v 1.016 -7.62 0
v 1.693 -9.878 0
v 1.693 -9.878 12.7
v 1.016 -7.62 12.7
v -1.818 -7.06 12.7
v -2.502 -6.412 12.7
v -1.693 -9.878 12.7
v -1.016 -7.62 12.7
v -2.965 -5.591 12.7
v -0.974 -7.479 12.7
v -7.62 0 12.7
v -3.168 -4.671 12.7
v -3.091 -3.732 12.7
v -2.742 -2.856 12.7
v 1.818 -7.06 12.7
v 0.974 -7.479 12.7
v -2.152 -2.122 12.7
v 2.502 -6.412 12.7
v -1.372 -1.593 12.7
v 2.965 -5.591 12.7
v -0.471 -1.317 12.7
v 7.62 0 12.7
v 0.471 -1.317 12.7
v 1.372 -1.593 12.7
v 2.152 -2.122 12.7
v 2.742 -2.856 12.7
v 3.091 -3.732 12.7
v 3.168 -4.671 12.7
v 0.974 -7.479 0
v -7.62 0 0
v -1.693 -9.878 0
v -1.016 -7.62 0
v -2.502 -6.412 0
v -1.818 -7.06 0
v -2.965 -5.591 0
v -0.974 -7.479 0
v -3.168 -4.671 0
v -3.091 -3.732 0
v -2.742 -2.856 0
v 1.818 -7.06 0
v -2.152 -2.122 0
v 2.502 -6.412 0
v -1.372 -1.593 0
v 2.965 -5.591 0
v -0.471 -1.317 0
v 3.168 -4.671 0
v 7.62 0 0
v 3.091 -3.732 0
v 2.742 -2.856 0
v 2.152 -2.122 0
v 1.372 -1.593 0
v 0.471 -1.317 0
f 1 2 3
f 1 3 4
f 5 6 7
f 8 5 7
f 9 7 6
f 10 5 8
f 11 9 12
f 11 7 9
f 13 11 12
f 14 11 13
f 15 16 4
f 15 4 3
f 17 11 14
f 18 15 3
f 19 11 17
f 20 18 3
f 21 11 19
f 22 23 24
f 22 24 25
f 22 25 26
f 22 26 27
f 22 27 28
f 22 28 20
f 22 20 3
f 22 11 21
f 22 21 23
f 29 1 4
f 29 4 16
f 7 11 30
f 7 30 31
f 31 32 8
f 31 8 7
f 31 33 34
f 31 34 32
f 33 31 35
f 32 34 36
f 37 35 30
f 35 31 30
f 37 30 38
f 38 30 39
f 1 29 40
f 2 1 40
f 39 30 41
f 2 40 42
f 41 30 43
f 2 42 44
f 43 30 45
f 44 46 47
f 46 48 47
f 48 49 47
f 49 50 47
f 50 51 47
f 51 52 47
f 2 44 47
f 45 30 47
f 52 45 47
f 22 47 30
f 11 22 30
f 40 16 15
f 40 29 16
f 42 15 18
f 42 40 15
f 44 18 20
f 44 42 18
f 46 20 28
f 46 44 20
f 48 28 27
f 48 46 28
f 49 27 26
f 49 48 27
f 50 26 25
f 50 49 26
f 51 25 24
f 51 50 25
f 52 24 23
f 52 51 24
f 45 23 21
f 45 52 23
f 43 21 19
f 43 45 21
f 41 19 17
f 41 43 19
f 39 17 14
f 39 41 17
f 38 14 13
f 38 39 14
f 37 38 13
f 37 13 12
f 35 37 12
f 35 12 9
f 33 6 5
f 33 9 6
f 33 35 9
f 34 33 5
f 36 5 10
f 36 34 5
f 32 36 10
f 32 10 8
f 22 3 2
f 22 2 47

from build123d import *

# Parameters (mm, degrees)
F3_DEPTH = 12.7
F4_DEPTH = 12.7
F1_R     = 3.175
F5_DEPTH = 12.7


with BuildPart() as f3:
    # F0 (on Top) → F3 (new body)
    with BuildSketch(Plane.XY):
        Polygon((0, -10.16), (0, 0), (-7.62, 0), (-1.524, -10.16), align=None)
        Polygon((7.62, 0), (0, 0), (0, -10.16), (1.524, -10.16), align=None)
    extrude(amount=F3_DEPTH)

    # F2 (on face) → F4 (cut)
    with BuildSketch(Plane.XY):
        Polygon((0, -5.08), (0, -7.62), (1.016, -7.62), (0.254, -5.08), align=None)
        Polygon((1.016, -7.62), (0, -7.62), (-1.016, -7.62), (-2.078659, -11.162197), (2.078659, -11.162197), align=None)
        Polygon((-1.016, -7.62), (0, -7.62), (0, -5.08), (-0.254, -5.08), align=None)
    extrude(amount=F4_DEPTH, mode=Mode.SUBTRACT)

    # F1 (on face) → F5 (cut)
    with BuildSketch(Plane.XY):
        with Locations((0, -4.456545)):
            Circle(F1_R)
    extrude(amount=F5_DEPTH, mode=Mode.SUBTRACT)


solid = f3.part
